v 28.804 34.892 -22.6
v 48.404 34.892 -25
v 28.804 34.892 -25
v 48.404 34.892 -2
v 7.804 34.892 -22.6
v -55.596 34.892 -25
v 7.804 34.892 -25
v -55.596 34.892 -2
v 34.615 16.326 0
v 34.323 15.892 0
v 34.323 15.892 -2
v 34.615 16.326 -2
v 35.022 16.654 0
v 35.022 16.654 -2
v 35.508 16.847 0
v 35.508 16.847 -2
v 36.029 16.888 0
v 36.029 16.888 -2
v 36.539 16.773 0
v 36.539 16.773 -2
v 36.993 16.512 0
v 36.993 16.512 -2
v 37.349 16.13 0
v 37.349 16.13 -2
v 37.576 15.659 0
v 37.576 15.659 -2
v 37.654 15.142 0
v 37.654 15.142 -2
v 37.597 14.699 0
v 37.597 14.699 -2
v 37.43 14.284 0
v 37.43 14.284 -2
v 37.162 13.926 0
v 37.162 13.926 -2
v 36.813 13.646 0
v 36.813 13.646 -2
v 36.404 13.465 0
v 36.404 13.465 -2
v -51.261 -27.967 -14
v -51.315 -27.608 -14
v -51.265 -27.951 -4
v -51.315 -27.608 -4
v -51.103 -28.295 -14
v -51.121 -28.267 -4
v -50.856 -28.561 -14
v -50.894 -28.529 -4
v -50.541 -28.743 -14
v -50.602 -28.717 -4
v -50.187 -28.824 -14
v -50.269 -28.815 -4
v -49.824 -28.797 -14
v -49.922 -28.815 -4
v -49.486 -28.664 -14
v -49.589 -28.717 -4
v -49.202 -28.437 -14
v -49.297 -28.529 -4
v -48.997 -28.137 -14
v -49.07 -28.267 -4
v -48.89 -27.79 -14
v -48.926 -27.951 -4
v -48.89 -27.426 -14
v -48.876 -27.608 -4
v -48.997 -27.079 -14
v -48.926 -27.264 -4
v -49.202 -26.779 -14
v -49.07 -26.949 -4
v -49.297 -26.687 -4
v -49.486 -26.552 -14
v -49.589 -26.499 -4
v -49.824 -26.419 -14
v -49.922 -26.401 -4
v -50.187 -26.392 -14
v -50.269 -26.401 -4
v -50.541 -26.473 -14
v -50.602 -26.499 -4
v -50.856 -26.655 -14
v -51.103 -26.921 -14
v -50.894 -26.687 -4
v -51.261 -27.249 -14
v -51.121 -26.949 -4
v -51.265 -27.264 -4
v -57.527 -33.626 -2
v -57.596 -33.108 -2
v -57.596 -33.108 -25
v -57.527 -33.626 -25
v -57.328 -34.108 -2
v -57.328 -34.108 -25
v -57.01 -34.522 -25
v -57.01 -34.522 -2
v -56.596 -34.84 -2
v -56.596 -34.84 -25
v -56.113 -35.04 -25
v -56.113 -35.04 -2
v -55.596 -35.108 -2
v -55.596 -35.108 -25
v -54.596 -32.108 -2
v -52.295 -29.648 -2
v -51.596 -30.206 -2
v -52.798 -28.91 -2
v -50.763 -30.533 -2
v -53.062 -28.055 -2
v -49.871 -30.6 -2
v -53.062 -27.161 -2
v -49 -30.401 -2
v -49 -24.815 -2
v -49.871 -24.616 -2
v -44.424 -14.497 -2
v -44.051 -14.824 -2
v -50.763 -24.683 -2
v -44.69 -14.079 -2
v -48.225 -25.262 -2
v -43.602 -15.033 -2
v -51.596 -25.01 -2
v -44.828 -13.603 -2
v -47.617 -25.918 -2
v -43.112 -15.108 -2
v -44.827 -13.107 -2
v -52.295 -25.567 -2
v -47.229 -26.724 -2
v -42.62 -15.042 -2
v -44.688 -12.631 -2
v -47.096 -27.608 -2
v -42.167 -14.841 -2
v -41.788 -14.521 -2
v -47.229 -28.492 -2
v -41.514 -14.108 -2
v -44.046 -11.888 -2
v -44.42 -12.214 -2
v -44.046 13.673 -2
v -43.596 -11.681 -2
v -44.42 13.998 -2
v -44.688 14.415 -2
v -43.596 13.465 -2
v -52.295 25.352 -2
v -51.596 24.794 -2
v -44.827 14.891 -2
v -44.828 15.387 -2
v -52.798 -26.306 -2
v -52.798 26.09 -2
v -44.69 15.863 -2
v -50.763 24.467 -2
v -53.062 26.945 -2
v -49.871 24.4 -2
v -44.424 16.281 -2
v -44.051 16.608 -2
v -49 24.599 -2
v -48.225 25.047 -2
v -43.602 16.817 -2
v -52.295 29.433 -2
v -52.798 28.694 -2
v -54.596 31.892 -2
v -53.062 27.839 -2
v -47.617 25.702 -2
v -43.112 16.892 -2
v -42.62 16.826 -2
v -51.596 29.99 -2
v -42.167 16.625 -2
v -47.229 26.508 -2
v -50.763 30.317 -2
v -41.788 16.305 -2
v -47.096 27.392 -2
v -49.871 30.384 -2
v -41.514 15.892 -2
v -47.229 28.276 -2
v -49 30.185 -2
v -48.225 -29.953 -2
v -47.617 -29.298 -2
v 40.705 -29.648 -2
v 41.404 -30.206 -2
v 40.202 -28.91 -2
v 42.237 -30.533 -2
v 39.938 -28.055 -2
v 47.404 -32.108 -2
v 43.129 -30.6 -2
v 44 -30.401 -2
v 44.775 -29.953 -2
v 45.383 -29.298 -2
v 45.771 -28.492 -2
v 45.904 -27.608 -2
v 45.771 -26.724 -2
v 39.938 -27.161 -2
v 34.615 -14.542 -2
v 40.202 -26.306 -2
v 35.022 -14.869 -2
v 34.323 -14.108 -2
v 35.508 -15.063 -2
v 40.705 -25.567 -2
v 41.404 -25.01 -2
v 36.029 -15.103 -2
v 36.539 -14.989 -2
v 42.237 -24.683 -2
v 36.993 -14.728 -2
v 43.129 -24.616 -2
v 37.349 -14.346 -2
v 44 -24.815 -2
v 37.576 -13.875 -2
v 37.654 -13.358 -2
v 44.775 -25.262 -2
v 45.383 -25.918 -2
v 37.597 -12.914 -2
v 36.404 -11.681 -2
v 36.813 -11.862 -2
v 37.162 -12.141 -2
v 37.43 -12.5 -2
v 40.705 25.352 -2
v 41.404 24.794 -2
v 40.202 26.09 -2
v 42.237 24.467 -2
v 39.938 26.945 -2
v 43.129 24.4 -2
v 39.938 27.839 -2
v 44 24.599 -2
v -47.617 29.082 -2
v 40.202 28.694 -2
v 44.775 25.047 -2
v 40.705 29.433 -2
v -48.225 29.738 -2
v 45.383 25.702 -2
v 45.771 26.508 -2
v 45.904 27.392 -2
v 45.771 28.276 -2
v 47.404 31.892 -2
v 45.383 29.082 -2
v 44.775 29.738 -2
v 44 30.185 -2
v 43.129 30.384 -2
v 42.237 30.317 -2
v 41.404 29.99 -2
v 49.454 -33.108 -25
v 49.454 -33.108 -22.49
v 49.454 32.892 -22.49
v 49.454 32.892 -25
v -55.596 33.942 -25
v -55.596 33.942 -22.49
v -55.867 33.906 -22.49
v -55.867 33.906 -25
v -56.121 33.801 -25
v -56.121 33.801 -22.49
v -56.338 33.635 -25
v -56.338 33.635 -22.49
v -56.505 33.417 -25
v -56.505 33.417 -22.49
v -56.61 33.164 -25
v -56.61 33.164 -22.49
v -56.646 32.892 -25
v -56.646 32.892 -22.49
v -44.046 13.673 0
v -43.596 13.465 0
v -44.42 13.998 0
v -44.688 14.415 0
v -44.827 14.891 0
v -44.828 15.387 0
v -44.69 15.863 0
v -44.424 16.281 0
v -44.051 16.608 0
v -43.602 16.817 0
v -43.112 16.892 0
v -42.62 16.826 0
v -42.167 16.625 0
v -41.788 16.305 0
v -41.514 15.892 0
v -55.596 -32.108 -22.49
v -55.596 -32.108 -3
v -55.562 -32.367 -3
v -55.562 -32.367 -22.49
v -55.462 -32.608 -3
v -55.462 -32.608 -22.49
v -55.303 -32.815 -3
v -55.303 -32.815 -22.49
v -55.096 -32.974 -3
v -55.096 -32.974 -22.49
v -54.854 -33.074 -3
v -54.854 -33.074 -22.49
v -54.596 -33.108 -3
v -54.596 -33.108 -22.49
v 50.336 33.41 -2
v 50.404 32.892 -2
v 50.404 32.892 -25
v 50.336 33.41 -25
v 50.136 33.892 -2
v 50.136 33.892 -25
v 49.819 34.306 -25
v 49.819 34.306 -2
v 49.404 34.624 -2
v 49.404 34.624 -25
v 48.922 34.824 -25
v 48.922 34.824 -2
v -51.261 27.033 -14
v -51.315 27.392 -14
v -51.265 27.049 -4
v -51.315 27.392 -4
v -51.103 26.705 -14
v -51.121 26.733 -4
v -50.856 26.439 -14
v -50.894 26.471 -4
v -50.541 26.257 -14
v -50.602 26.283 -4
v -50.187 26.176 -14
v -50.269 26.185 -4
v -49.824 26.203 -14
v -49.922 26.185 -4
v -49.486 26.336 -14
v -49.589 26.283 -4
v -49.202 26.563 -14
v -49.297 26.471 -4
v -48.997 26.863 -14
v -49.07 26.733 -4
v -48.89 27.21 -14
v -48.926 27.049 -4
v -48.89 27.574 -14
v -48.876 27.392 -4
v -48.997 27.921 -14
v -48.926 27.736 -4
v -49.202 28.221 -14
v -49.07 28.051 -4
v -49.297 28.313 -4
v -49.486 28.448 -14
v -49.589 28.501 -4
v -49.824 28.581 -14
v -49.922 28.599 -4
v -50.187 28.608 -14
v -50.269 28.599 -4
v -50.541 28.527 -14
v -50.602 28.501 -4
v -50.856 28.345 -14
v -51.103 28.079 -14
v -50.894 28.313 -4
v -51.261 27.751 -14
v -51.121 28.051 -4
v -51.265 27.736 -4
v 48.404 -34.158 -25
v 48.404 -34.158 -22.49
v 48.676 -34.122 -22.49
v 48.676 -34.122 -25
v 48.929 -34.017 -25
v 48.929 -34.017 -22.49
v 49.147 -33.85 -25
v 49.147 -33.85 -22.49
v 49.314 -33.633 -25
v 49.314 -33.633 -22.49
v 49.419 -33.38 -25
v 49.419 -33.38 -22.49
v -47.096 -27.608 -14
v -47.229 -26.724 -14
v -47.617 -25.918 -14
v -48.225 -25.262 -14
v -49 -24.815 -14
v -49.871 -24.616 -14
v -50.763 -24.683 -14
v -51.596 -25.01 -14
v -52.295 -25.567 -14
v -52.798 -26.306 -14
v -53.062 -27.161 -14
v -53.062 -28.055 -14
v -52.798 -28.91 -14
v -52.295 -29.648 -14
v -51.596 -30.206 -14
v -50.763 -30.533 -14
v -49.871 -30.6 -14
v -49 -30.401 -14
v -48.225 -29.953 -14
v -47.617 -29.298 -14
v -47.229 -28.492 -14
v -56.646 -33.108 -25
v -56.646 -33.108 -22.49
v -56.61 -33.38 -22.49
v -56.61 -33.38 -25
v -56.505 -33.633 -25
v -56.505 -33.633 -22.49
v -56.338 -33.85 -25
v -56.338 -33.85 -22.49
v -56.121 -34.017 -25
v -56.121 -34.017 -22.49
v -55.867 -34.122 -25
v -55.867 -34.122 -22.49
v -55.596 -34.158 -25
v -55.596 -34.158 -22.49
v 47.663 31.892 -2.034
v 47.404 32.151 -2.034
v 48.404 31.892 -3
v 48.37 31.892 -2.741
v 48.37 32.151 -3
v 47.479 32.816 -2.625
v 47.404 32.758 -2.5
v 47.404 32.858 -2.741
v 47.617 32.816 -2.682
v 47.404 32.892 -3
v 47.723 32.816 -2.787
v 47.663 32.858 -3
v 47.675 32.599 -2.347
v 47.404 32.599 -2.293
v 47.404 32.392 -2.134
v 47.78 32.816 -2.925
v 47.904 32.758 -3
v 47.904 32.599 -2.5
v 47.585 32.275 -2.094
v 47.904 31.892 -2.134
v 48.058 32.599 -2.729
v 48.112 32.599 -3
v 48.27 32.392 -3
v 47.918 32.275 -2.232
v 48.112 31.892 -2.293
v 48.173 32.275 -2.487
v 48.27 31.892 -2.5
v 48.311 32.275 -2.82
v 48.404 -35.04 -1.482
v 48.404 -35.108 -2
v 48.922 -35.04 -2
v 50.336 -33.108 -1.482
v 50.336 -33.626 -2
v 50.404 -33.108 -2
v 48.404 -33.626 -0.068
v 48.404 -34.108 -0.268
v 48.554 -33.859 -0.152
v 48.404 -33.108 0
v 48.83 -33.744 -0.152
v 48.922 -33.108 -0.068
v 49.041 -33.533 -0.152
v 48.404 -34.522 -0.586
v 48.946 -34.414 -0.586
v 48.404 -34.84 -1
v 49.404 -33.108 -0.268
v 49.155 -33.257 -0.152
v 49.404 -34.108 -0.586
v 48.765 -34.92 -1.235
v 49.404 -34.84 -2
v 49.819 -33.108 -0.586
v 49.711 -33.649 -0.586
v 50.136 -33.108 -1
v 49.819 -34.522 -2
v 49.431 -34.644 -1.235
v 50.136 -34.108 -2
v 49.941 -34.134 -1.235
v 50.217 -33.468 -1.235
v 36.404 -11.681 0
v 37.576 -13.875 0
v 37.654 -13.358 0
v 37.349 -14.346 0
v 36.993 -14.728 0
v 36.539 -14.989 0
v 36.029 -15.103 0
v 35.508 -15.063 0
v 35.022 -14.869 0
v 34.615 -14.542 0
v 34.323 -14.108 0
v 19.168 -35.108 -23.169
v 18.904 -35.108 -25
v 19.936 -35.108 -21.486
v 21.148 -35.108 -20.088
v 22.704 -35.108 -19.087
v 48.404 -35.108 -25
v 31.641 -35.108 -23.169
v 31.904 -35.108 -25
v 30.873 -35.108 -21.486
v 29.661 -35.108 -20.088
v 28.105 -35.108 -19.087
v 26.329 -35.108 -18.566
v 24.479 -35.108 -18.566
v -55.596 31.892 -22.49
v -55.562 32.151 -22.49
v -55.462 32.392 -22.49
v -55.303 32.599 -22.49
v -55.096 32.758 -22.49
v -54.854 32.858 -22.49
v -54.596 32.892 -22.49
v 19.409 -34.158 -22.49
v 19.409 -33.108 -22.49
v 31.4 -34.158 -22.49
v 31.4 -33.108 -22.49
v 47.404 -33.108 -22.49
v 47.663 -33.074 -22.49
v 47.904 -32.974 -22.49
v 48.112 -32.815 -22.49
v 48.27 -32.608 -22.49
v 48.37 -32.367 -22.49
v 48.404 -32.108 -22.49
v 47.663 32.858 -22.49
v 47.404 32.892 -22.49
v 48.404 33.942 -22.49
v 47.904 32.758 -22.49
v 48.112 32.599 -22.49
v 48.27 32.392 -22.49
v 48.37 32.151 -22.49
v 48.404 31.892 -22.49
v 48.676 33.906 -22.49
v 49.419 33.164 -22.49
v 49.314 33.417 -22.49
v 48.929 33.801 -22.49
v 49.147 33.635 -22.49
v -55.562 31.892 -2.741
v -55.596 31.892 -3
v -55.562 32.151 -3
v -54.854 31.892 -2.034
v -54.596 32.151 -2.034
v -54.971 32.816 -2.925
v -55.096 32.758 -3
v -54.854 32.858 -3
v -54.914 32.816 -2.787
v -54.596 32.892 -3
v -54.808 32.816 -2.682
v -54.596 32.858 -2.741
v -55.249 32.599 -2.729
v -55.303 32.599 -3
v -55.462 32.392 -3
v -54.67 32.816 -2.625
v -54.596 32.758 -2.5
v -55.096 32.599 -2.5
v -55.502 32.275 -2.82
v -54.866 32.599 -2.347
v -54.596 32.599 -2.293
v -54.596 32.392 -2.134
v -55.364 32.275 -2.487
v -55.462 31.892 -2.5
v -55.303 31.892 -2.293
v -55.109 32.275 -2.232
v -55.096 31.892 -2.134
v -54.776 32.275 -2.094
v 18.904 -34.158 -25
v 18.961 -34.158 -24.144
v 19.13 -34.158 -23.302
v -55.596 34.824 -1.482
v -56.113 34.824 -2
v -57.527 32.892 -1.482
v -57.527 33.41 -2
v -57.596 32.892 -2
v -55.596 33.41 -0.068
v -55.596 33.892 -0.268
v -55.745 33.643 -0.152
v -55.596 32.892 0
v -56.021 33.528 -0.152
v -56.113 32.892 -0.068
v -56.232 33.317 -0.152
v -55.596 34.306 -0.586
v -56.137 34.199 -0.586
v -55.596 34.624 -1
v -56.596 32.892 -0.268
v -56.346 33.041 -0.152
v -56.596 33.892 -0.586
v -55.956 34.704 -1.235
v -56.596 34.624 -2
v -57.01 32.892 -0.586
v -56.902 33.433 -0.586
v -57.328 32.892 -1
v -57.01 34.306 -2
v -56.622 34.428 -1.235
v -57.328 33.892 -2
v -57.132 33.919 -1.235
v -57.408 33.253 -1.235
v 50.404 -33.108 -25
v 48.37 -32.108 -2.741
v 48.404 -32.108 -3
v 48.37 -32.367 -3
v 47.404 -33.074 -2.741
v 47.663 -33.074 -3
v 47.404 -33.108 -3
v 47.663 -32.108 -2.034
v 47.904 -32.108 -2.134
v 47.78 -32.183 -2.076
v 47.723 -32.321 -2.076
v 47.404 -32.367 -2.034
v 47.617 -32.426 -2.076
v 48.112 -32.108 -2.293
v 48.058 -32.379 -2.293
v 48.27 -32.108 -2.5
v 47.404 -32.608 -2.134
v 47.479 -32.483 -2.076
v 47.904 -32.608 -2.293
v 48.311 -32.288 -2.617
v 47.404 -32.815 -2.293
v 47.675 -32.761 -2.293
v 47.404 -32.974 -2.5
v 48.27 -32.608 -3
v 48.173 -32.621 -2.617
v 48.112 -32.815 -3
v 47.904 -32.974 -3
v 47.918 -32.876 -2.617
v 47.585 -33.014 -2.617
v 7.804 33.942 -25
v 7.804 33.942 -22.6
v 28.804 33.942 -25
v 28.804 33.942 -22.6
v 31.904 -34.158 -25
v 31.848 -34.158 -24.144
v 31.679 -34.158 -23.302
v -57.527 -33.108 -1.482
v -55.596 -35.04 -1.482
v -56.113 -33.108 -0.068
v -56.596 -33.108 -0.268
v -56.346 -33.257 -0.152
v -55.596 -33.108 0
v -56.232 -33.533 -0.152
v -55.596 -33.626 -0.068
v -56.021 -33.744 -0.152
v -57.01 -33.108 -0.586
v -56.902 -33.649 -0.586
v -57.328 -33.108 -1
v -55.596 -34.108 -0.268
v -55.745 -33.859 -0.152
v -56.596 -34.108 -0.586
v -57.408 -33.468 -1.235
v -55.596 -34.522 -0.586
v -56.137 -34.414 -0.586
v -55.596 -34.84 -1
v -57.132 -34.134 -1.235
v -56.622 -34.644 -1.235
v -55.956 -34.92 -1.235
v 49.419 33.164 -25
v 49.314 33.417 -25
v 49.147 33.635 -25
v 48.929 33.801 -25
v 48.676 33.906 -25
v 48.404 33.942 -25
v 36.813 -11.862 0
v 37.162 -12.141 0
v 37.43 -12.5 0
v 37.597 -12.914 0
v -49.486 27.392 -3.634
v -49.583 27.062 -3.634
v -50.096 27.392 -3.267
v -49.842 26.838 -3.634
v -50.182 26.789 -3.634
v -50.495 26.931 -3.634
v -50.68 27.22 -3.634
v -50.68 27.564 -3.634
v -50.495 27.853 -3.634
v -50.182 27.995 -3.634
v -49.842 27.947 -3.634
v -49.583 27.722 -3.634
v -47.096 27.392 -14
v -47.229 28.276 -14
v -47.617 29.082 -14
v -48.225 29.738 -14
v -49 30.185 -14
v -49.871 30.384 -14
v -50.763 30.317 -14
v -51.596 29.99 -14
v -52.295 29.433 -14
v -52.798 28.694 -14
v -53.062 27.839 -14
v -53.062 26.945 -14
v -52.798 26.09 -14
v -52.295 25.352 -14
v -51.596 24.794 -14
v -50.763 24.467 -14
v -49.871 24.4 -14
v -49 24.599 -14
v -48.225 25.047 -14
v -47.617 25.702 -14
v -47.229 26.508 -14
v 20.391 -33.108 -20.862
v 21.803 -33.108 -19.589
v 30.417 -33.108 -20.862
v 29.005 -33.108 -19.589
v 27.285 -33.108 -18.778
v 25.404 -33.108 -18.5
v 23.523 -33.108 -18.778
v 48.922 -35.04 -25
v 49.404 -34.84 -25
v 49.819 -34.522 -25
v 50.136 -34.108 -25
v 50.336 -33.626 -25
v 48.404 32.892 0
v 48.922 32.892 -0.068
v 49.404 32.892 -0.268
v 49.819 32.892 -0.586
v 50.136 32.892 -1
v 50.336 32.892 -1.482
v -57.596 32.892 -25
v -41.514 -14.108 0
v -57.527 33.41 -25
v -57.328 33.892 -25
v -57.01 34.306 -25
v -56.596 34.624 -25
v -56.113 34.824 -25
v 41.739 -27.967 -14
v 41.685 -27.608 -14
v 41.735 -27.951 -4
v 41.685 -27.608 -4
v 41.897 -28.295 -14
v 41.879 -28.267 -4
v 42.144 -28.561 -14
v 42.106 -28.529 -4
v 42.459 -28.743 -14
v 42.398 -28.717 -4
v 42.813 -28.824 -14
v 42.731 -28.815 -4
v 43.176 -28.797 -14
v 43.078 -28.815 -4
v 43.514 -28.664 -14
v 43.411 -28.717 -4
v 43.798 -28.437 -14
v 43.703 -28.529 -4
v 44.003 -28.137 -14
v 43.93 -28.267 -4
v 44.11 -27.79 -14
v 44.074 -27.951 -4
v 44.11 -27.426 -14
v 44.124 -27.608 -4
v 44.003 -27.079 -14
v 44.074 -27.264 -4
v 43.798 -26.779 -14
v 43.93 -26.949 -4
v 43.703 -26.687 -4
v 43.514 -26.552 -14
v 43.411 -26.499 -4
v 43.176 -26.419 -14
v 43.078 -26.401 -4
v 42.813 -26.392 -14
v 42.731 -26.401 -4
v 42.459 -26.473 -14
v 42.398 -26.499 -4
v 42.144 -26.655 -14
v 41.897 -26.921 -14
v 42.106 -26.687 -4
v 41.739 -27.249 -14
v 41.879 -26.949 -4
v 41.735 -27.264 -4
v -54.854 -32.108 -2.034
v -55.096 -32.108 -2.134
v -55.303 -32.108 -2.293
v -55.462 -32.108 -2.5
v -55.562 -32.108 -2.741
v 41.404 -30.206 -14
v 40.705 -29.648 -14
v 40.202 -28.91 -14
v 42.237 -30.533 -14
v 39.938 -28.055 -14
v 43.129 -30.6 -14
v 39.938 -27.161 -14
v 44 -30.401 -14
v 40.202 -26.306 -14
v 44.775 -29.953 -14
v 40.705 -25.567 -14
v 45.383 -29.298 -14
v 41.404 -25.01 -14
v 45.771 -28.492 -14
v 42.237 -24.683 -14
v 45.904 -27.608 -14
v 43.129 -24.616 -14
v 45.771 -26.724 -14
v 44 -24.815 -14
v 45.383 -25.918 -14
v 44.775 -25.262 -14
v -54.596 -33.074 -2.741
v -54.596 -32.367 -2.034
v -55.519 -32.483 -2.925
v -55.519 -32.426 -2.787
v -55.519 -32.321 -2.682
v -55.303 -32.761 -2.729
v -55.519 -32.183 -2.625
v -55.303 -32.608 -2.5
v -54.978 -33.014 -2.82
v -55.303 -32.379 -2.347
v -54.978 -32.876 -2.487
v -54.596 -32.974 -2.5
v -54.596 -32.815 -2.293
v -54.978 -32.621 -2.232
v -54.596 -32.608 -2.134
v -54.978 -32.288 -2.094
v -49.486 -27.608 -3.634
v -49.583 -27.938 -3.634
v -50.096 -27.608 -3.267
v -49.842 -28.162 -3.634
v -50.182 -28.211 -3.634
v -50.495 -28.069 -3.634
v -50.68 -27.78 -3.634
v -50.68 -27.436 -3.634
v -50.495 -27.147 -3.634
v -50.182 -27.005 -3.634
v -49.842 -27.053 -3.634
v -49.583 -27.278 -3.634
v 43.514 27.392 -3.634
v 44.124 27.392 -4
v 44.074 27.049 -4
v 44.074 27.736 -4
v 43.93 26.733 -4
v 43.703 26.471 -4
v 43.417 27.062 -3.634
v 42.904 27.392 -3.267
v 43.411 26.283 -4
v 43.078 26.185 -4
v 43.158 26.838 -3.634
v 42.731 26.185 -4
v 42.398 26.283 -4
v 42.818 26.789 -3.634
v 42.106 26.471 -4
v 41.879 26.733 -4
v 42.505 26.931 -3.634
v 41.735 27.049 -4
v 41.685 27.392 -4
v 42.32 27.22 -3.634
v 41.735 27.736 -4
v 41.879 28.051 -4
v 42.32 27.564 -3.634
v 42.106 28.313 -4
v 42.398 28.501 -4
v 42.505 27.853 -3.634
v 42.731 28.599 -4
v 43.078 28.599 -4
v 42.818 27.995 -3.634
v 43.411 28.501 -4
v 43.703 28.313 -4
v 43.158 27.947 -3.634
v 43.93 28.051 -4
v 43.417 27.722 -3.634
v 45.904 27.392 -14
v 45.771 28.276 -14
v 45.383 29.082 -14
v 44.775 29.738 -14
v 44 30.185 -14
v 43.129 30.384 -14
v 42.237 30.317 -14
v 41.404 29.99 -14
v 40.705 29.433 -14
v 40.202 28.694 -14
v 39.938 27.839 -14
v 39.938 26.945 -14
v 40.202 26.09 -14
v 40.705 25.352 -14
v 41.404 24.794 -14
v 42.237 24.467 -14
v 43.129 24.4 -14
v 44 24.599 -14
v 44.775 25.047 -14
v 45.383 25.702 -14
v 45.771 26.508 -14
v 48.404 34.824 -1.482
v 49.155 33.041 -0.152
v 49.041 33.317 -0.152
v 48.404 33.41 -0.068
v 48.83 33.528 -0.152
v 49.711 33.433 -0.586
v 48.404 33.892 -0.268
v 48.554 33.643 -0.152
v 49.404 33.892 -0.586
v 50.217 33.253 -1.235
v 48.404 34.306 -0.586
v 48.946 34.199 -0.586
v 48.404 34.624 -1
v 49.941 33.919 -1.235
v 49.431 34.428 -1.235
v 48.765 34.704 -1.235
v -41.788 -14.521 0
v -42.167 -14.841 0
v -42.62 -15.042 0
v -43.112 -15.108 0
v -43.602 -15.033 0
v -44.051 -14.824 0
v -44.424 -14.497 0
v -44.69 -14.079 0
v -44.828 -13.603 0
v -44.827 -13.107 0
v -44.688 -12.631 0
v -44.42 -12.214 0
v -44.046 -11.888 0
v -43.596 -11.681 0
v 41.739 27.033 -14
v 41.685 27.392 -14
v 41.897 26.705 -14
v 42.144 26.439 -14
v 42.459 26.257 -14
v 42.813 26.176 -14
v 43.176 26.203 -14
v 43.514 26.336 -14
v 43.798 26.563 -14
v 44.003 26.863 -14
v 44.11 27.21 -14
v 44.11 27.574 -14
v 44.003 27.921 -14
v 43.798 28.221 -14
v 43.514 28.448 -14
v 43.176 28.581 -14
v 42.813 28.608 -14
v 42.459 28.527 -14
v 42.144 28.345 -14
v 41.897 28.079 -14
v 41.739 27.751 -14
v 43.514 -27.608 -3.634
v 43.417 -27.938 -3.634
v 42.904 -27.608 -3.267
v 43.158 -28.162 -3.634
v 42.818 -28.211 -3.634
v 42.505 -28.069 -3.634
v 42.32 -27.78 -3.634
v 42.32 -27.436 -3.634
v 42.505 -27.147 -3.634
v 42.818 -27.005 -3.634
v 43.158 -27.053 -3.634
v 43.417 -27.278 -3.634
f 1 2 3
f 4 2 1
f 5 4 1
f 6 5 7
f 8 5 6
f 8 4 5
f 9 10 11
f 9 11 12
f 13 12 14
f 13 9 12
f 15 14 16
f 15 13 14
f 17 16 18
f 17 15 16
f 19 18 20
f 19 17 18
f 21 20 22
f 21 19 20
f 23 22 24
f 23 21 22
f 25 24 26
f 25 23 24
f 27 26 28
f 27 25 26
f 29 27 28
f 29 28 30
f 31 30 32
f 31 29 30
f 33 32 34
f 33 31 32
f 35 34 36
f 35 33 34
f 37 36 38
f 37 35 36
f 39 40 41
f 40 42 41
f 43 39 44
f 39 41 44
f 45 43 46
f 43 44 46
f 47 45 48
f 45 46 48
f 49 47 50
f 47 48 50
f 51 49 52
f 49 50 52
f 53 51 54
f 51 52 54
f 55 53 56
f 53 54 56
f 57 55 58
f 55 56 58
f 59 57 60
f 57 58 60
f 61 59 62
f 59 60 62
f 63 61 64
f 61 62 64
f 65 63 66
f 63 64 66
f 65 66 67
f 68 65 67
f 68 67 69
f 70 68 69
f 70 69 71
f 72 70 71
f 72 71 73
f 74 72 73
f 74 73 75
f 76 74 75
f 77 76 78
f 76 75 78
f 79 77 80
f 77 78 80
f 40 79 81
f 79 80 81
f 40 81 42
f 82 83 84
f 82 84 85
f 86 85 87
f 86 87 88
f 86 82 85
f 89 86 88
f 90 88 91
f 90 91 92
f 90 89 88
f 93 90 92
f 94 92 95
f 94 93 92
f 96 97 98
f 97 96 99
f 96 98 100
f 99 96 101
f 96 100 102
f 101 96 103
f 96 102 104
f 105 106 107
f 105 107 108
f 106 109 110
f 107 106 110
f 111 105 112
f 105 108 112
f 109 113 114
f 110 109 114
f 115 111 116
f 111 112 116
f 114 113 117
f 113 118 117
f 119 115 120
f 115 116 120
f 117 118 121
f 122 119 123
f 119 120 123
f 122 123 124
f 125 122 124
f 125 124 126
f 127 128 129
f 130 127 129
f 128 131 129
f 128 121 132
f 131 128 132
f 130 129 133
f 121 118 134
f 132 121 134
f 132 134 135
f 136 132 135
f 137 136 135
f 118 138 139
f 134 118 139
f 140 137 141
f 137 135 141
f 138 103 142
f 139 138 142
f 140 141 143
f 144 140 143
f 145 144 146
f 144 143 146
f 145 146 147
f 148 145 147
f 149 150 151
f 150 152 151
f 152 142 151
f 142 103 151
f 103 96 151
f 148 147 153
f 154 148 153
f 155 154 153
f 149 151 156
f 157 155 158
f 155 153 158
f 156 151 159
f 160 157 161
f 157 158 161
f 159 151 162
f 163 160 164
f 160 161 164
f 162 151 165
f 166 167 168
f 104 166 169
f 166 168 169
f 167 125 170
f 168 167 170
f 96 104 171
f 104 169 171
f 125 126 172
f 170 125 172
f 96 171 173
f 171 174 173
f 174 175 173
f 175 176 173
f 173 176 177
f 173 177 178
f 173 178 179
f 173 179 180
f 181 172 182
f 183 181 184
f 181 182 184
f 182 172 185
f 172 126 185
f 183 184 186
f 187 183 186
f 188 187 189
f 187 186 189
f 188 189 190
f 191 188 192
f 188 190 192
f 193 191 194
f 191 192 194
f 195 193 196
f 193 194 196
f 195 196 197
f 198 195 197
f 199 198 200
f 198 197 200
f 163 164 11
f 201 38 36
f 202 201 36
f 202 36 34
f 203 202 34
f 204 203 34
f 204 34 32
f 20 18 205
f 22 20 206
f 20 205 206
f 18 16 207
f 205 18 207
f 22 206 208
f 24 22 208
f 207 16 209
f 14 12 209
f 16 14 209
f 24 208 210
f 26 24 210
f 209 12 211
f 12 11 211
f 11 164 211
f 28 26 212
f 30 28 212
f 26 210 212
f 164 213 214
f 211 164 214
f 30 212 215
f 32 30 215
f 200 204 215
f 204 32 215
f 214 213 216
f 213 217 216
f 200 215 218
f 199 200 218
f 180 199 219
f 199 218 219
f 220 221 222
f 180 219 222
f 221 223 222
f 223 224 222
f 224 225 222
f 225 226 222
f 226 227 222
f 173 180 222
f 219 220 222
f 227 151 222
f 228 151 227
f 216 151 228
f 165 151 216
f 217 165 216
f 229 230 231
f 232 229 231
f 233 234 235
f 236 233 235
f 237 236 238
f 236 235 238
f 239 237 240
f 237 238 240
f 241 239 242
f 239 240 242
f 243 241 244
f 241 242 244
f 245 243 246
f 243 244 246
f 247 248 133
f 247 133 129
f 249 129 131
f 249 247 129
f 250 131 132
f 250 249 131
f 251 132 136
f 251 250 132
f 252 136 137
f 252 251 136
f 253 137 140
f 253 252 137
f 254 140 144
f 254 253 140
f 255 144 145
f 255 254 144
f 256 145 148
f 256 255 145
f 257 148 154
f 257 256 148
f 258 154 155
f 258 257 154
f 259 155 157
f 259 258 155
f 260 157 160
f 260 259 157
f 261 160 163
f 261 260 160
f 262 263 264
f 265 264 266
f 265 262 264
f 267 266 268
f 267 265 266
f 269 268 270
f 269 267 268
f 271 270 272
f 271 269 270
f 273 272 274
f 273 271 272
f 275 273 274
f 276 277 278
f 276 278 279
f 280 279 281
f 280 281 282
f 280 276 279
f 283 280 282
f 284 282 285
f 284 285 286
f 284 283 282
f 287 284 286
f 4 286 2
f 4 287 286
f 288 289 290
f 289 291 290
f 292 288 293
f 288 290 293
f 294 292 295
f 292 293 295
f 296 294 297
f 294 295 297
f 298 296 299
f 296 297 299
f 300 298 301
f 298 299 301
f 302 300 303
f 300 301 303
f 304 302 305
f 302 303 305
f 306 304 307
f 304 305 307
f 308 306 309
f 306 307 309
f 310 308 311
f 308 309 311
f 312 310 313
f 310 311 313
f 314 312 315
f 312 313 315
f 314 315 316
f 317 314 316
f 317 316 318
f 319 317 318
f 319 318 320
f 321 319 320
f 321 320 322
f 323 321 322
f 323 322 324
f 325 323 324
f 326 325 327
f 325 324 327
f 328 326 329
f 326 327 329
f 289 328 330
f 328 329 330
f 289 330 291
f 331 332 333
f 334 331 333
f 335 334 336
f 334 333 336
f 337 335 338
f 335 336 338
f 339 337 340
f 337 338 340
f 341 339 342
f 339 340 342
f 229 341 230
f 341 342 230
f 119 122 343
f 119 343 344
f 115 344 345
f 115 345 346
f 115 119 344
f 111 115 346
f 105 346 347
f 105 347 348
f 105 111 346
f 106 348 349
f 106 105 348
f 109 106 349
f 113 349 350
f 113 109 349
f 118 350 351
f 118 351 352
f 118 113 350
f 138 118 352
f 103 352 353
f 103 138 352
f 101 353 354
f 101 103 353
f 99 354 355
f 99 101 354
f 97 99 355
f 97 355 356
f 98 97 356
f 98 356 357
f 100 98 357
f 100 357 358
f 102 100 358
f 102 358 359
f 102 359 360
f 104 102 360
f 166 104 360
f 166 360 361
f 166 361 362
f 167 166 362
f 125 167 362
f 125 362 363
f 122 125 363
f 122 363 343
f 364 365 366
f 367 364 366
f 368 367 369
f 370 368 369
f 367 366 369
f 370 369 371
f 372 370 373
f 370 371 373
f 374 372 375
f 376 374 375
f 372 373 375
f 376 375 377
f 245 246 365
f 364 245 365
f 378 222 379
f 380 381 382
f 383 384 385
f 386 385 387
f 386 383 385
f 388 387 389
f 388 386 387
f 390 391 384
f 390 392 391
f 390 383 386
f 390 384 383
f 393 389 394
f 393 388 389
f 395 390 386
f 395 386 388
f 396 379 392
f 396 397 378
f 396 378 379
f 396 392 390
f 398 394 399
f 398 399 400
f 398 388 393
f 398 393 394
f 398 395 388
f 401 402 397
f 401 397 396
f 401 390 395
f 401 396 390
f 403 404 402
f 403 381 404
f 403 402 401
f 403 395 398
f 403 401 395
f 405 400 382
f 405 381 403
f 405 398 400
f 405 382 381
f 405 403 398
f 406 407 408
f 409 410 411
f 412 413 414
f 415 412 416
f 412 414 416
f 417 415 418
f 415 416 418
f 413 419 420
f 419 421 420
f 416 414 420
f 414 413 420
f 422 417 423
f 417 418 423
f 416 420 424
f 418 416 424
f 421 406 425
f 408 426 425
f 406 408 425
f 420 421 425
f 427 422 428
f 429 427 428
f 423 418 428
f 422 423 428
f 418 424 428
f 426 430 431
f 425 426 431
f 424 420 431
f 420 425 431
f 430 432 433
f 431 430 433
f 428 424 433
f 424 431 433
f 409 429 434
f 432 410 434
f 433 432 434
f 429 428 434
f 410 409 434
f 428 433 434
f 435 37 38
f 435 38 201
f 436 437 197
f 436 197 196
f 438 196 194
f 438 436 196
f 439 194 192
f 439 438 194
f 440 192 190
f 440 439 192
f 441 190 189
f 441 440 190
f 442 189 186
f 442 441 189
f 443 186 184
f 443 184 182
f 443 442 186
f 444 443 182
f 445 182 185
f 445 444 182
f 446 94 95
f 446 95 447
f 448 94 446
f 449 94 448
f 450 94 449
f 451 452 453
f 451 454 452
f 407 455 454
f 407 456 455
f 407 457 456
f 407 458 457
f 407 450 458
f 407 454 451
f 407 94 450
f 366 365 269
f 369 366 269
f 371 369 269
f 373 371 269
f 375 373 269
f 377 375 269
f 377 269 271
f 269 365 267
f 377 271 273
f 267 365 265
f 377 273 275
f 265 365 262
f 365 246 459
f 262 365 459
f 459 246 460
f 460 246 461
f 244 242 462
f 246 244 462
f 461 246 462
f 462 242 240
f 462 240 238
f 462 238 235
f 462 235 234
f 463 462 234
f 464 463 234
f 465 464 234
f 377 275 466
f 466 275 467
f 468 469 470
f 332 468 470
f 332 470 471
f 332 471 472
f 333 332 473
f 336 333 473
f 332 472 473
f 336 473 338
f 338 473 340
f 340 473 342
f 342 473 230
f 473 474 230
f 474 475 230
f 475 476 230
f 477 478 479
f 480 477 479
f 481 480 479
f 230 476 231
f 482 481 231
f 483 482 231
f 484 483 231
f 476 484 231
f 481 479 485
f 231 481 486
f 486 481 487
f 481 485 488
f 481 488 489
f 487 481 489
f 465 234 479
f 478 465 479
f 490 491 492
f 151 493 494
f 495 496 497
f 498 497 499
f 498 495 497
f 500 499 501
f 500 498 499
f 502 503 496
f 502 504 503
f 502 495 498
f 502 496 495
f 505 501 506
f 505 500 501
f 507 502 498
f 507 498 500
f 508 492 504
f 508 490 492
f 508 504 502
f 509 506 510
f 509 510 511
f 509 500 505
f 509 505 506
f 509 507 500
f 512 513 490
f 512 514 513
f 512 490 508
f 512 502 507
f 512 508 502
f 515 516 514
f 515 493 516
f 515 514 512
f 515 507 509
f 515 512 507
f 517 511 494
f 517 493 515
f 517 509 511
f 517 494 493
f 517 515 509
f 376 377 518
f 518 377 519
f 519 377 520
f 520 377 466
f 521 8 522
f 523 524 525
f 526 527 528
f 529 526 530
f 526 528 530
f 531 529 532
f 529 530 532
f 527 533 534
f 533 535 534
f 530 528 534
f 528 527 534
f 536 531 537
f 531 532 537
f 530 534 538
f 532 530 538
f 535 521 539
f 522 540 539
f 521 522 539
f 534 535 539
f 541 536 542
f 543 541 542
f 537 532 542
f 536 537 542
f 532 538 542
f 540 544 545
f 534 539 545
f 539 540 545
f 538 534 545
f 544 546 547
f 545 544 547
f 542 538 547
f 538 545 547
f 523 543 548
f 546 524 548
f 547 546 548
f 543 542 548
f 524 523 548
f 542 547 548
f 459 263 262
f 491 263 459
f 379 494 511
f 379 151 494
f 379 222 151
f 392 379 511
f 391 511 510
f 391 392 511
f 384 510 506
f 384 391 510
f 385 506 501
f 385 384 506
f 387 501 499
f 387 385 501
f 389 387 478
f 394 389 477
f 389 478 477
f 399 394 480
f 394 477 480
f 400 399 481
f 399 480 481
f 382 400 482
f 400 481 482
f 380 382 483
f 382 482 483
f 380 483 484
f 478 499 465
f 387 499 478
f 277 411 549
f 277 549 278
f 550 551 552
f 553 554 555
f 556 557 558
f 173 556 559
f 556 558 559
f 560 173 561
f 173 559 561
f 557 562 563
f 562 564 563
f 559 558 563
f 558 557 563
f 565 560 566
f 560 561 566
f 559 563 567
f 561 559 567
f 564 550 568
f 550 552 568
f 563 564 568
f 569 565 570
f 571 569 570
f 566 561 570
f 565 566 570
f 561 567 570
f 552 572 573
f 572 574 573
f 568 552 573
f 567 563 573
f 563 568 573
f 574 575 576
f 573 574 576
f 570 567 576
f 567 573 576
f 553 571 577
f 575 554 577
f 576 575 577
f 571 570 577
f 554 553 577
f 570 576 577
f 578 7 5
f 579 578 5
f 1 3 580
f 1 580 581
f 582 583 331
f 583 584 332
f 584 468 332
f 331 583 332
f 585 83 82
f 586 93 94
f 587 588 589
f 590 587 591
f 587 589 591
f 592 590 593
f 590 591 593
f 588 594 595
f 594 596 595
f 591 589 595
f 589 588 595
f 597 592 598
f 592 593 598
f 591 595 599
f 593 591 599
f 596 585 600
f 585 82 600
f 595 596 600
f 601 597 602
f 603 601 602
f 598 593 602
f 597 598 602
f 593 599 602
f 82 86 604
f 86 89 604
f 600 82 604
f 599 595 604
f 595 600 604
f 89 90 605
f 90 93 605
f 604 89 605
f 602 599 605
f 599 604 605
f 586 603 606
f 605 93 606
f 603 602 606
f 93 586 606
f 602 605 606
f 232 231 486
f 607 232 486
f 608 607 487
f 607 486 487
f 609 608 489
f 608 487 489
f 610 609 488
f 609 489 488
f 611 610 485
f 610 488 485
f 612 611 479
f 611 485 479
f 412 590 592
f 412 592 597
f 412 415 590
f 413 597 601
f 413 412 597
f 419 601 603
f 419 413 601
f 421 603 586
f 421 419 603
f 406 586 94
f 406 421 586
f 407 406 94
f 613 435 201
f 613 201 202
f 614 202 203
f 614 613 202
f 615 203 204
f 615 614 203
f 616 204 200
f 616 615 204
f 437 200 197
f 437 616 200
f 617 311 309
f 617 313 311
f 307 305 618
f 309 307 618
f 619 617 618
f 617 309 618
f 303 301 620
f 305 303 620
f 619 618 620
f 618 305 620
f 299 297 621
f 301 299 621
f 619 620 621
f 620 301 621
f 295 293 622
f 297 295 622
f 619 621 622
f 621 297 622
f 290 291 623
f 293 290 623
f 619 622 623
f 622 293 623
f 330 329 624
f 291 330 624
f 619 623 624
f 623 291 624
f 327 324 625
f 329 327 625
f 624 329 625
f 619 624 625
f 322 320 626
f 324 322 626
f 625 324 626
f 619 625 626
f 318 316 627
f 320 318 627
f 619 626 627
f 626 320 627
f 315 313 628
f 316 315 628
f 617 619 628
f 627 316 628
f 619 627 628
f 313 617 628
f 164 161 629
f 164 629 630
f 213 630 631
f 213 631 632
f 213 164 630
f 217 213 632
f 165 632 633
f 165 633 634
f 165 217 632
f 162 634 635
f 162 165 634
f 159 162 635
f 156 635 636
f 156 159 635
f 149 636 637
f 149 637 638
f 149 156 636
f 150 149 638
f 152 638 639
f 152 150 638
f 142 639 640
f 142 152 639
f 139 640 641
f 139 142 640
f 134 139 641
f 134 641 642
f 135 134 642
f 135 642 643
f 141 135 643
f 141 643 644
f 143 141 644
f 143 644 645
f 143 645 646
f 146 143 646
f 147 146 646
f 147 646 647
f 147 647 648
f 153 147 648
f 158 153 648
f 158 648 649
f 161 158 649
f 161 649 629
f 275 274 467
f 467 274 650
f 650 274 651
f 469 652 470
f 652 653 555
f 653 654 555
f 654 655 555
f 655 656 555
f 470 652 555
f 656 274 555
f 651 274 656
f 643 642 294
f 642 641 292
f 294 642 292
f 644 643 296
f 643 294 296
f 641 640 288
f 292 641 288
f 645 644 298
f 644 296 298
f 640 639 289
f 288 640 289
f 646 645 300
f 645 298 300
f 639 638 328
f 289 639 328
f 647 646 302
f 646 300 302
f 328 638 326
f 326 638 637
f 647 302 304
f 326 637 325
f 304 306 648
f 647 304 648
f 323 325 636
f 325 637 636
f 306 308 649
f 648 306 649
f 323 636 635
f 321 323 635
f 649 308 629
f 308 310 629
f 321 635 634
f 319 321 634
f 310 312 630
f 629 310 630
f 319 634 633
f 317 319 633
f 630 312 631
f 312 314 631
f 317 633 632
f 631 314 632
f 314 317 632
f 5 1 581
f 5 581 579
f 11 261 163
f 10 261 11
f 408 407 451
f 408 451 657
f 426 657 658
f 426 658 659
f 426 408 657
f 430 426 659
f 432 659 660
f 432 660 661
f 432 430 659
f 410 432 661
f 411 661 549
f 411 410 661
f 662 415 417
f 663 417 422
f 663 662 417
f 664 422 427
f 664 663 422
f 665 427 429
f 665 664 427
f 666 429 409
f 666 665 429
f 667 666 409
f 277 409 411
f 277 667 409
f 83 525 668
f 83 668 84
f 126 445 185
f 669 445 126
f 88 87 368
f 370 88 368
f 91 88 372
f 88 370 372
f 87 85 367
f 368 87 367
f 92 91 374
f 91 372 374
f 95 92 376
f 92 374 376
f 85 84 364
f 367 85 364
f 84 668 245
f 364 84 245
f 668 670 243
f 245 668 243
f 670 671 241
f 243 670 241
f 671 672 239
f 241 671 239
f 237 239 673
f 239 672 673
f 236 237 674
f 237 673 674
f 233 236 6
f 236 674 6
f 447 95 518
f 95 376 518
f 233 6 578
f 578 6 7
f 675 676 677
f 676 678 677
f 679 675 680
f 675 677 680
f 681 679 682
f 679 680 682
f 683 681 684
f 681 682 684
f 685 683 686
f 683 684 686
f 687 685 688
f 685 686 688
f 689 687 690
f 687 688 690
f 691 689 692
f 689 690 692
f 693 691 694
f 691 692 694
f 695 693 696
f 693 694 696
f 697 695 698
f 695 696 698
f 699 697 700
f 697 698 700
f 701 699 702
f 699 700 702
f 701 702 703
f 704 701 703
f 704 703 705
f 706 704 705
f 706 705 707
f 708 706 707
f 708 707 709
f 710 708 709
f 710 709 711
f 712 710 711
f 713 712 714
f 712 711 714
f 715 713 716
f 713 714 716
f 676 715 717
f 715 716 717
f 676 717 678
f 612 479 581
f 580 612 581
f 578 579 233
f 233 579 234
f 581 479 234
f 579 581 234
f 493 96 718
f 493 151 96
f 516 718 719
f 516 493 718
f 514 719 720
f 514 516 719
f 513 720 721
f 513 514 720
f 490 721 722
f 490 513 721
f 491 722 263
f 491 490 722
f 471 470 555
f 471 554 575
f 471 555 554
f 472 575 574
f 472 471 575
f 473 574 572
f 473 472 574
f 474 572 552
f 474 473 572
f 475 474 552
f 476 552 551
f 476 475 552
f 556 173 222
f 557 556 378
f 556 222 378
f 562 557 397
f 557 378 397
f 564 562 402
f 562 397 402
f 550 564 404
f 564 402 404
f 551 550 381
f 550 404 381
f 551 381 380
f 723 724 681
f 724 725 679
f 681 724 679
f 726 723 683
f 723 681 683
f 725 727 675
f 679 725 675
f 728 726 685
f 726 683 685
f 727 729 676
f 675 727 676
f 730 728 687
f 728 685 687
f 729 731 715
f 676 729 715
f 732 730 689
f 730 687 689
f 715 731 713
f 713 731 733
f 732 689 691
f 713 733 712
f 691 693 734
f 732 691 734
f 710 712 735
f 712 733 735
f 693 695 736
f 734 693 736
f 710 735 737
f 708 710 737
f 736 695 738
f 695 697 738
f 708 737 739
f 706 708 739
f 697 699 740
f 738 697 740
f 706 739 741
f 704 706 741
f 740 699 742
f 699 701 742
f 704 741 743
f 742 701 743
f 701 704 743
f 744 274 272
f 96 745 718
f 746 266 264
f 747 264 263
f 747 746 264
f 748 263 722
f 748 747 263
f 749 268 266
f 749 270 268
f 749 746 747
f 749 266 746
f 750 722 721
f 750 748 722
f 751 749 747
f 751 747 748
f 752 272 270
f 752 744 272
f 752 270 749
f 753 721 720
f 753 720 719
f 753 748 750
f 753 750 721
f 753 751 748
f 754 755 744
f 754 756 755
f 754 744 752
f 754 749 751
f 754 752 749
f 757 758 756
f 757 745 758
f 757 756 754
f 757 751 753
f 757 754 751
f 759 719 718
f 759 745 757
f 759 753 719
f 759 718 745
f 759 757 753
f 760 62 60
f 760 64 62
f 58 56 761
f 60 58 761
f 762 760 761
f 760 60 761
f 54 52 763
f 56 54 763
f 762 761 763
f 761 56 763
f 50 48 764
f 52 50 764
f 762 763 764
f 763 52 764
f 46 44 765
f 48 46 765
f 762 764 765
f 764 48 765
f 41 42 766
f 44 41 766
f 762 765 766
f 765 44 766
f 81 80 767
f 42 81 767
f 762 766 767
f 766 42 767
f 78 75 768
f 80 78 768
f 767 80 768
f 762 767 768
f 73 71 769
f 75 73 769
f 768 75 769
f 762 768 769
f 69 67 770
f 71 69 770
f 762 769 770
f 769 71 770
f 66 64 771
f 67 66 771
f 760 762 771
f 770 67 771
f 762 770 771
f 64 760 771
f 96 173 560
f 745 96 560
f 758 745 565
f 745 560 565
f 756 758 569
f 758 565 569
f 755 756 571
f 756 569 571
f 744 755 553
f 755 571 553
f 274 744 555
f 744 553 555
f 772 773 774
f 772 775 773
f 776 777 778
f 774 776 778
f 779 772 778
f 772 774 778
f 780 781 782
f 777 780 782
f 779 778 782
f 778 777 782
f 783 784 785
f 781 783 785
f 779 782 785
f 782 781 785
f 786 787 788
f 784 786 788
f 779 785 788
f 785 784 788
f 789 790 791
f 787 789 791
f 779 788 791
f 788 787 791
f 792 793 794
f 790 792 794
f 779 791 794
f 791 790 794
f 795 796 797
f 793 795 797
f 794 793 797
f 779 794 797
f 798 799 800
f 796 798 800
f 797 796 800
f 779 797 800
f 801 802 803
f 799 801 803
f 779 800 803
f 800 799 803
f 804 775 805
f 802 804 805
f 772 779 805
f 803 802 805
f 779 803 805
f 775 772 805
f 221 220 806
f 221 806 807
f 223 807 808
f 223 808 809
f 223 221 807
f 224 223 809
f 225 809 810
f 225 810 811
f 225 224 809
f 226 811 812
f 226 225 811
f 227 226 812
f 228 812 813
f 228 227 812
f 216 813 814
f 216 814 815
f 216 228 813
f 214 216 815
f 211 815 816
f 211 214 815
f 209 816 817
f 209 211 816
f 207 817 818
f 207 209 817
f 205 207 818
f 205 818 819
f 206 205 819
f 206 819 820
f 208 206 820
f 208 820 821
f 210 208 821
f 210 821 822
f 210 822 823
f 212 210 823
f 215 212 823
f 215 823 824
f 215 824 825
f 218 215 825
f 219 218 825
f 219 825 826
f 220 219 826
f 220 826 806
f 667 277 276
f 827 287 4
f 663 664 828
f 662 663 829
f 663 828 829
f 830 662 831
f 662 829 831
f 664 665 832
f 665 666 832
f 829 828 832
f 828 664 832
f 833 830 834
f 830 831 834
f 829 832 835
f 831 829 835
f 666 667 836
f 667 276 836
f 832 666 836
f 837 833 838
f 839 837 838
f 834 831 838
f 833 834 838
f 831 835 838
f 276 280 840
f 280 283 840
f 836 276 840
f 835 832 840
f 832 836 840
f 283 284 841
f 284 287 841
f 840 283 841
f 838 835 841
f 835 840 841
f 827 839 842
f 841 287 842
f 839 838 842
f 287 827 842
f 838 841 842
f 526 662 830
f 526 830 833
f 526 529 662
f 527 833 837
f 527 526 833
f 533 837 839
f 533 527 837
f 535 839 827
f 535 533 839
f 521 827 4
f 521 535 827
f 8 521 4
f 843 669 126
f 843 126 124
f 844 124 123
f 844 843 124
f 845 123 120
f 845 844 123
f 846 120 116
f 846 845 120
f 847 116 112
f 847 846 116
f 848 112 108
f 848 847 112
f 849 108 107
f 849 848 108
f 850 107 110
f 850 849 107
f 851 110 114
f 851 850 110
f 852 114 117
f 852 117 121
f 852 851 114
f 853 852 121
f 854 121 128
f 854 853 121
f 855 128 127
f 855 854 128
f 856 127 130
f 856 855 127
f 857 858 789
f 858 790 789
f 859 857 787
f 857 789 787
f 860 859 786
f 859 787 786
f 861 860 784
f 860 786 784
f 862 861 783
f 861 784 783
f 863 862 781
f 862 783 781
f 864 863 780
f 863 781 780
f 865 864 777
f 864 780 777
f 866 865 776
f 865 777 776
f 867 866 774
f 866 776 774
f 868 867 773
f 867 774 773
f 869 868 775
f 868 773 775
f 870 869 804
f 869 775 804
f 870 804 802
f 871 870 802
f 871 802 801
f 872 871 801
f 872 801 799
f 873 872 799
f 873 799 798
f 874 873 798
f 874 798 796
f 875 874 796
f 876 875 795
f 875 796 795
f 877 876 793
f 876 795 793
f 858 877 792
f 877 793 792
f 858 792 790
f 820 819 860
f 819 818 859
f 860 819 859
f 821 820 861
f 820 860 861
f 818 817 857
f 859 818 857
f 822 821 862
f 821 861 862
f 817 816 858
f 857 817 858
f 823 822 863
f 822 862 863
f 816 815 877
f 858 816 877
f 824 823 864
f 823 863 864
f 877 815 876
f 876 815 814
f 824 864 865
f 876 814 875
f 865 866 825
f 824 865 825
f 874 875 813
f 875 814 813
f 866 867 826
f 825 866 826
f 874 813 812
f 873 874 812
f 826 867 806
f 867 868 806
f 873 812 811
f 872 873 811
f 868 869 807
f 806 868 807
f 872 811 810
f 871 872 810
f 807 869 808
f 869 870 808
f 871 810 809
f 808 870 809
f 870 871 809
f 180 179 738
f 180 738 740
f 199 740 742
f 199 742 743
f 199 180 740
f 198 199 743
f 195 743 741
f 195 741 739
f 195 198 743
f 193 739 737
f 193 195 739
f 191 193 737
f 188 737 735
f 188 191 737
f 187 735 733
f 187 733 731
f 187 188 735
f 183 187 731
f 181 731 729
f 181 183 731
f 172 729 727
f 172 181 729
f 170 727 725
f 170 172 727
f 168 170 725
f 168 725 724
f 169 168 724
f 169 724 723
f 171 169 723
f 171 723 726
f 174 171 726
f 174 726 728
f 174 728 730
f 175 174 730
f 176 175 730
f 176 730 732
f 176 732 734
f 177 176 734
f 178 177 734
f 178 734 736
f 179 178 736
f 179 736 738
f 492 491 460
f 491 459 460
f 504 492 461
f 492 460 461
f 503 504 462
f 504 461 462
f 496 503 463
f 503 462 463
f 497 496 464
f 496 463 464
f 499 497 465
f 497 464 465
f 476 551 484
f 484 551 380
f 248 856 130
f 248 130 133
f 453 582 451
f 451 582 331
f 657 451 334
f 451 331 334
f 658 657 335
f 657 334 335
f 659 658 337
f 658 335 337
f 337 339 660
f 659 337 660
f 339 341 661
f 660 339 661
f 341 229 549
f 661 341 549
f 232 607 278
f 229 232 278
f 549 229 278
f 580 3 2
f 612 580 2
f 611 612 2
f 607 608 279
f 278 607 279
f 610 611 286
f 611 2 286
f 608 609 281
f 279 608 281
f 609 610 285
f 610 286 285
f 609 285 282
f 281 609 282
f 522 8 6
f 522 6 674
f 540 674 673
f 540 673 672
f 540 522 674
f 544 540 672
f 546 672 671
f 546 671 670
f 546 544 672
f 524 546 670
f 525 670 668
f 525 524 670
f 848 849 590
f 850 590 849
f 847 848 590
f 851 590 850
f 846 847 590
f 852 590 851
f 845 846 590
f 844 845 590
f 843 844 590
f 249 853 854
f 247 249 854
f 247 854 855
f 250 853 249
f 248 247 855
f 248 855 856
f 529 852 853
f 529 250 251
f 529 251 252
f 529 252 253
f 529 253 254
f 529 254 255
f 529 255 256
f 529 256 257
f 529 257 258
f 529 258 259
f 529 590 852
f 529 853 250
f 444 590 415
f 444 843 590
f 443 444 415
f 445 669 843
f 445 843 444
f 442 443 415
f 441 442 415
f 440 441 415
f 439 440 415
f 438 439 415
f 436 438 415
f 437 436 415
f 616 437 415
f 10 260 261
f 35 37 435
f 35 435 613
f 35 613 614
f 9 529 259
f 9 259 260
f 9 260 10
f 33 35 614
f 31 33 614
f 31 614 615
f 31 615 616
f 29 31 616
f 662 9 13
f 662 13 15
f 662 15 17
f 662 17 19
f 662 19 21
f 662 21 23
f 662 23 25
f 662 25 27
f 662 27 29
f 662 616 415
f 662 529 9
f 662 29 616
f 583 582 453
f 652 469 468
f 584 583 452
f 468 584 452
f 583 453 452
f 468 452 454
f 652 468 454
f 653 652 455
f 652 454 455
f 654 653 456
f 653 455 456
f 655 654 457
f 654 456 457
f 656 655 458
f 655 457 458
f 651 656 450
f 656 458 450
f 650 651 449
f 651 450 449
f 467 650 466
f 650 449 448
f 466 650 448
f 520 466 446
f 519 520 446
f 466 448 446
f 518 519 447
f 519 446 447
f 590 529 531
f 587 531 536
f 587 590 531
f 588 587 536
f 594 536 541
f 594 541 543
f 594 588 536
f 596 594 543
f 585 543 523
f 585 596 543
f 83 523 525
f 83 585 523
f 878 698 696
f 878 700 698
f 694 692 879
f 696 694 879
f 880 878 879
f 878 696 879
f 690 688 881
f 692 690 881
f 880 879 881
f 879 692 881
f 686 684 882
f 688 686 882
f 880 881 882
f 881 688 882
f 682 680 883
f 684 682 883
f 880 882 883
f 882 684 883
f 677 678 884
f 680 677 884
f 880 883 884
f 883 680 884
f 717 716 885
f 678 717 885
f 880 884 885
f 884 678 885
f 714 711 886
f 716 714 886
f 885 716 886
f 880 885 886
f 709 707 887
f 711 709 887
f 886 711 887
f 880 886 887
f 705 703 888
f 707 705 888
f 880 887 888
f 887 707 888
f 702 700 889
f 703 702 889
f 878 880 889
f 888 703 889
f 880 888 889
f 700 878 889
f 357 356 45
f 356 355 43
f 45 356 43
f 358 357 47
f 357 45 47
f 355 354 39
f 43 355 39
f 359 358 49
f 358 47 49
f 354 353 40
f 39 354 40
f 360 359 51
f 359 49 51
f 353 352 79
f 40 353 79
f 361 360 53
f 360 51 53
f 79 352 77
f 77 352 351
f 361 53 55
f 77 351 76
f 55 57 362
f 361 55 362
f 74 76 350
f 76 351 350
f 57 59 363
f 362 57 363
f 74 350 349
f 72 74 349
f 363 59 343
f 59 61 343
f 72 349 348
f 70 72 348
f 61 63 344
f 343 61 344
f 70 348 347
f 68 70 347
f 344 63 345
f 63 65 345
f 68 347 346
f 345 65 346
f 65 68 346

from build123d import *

# Parameters (mm, degrees)
F0_W      = 104
F0_H      = 66
F0_R      = 3
F1_DEPTH  = 2
F2_DEPTH  = 22.49
F3_DEPTH  = 23
F4_DEPTH  = 14
F6_DEPTH  = 2.5
F7_W      = 21
F7_H      = 2.4
F8_DEPTH  = 2.5
F10_D     = 2.4384
F10_DEPTH = 10
F10_TIP   = 0.7325692667
F11_R     = 2
F12_R     = 1


with BuildPart() as f1:
    # F0 (on Top) → F1 (new body)
    with BuildSketch(Plane.XY):
        with BuildLine():
            Line((48.4044117422, 34.8920698583), (-55.5955882578, 34.8920698583))
            ThreePointArc((-55.5955882578, 34.8920698583), (-57.0098018202, 34.3062834207), (-57.5955882578, 32.8920698583))
            Line((-57.5955882578, 32.8920698583), (-57.5955882578, -33.1079301417))
            ThreePointArc((-57.5955882578, -33.1079301417), (-57.0098018202, -34.5221437041), (-55.5955882578, -35.1079301417))
            Line((-55.5955882578, -35.1079301417), (48.4044117422, -35.1079301417))
            ThreePointArc((48.4044117422, -35.1079301417), (49.8186253046, -34.5221437041), (50.4044117422, -33.1079301417))
            Line((50.4044117422, -33.1079301417), (50.4044117422, 32.8920698583))
            ThreePointArc((50.4044117422, 32.8920698583), (49.8186253046, 34.3062834207), (48.4044117422, 34.8920698583))
        make_face()
        with BuildLine():
            ThreePointArc((-56.6455882578, 32.8920698583), (-56.338050378, 33.6345319786), (-55.5955882578, 33.9420698583))
            Line((-55.5955882578, 33.9420698583), (48.4044117422, 33.9420698583))
            ThreePointArc((48.4044117422, 33.9420698583), (49.1468738625, 33.6345319786), (49.4544117422, 32.8920698583))
            Line((49.4544117422, 32.8920698583), (49.4544117422, -33.1079301417))
            ThreePointArc((49.4544117422, -33.1079301417), (49.1468738625, -33.8503922619), (48.4044117422, -34.1579301417))
            Line((48.4044117422, -34.1579301417), (-55.5955882578, -34.1579301417))
            ThreePointArc((-55.5955882578, -34.1579301417), (-56.338050378, -33.8503922619), (-56.6455882578, -33.1079301417))
            Line((-56.6455882578, -33.1079301417), (-56.6455882578, 32.8920698583))
        make_face(mode=Mode.SUBTRACT)
        with BuildLine():
            Line((48.4044117422, 33.9420698583), (-55.5955882578, 33.9420698583))
            ThreePointArc((-55.5955882578, 33.9420698583), (-56.338050378, 33.6345319786), (-56.6455882578, 32.8920698583))
            Line((-56.6455882578, 32.8920698583), (-56.6455882578, -33.1079301417))
            ThreePointArc((-56.6455882578, -33.1079301417), (-56.338050378, -33.8503922619), (-55.5955882578, -34.1579301417))
            Line((-55.5955882578, -34.1579301417), (48.4044117422, -34.1579301417))
            ThreePointArc((48.4044117422, -34.1579301417), (49.1468738625, -33.8503922619), (49.4544117422, -33.1079301417))
            Line((49.4544117422, -33.1079301417), (49.4544117422, 32.8920698583))
            ThreePointArc((49.4544117422, 32.8920698583), (49.1468738625, 33.6345319786), (48.4044117422, 33.9420698583))
        make_face()
        with Locations((-3.5955882578, -0.1079301417)):
            Rectangle(F0_W, F0_H, mode=Mode.SUBTRACT)
        with Locations((-3.5955882578, -0.1079301417)):
            Rectangle(F0_W, F0_H)
        with Locations((-50.0955882578, -27.6079301417)):
            Circle(F0_R, mode=Mode.SUBTRACT)
        with Locations((42.9044117422, -27.6079301417)):
            Circle(F0_R, mode=Mode.SUBTRACT)
        with Locations((-50.0955882578, 27.3920698583)):
            Circle(F0_R, mode=Mode.SUBTRACT)
        with BuildLine():
            ThreePointArc((-43.5955882578, 13.4650188752), (-44.424068371, 16.2812101433), (-41.5144494277, 15.8920698583))
            Line((-41.5144494277, 15.8920698583), (34.3232729121, 15.8920698583))
            ThreePointArc((34.3232729121, 15.8920698583), (36.2887989476, 16.8493327192), (37.6544117422, 15.1420698583))
            ThreePointArc((37.6544117422, 15.1420698583), (37.3075332623, 14.0962448251), (36.4044117422, 13.4650188752))
            Line((36.4044117422, 13.4650188752), (36.4044117422, -11.6808791586))
            ThreePointArc((36.4044117422, -11.6808791586), (37.3075332623, -12.3121051085), (37.6544117422, -13.3579301417))
            ThreePointArc((37.6544117422, -13.3579301417), (36.2887989476, -15.0651930026), (34.3232729121, -14.1079301417))
            Line((34.3232729121, -14.1079301417), (-41.5144494277, -14.1079301417))
            ThreePointArc((-41.5144494277, -14.1079301417), (-44.424068371, -14.4970704267), (-43.5955882578, -11.6808791586))
            Line((-43.5955882578, -11.6808791586), (-43.5955882578, 13.4650188752))
        make_face(mode=Mode.SUBTRACT)
        with Locations((42.9044117422, 27.3920698583)):
            Circle(F0_R, mode=Mode.SUBTRACT)
        with Locations((-50.0955882578, 27.3920698583)):
            Circle(F0_R)
        with Locations((42.9044117422, 27.3920698583)):
            Circle(F0_R)
        with Locations((42.9044117422, -27.6079301417)):
            Circle(F0_R)
        with Locations((-50.0955882578, -27.6079301417)):
            Circle(F0_R)
    extrude(amount=-F1_DEPTH)

    # F0 (on Top) → F2 (join)
    with BuildSketch(Plane.XY):
        with BuildLine():
            Line((48.4044117422, 33.9420698583), (-55.5955882578, 33.9420698583))
            ThreePointArc((-55.5955882578, 33.9420698583), (-56.338050378, 33.6345319786), (-56.6455882578, 32.8920698583))
            Line((-56.6455882578, 32.8920698583), (-56.6455882578, -33.1079301417))
            ThreePointArc((-56.6455882578, -33.1079301417), (-56.338050378, -33.8503922619), (-55.5955882578, -34.1579301417))
            Line((-55.5955882578, -34.1579301417), (48.4044117422, -34.1579301417))
            ThreePointArc((48.4044117422, -34.1579301417), (49.1468738625, -33.8503922619), (49.4544117422, -33.1079301417))
            Line((49.4544117422, -33.1079301417), (49.4544117422, 32.8920698583))
            ThreePointArc((49.4544117422, 32.8920698583), (49.1468738625, 33.6345319786), (48.4044117422, 33.9420698583))
        make_face()
        with Locations((-3.5955882578, -0.1079301417)):
            Rectangle(F0_W, F0_H, mode=Mode.SUBTRACT)
    extrude(amount=-F2_DEPTH)

    # F3 (add): a face of the model
    f3_faces = [f1.faces().sort_by_distance(p)[0] for p in [
        (-3.5955882578, 34.763368654, -2),
    ]]
    extrude(f3_faces, amount=F3_DEPTH)

    # F0 (on Top) → F4 (join)
    with BuildSketch(Plane.XY):
        with Locations((-50.0955882578, 27.3920698583)):
            Circle(F0_R)
        with Locations((42.9044117422, 27.3920698583)):
            Circle(F0_R)
        with Locations((-50.0955882578, -27.6079301417)):
            Circle(F0_R)
        with Locations((42.9044117422, -27.6079301417)):
            Circle(F0_R)
    extrude(amount=-F4_DEPTH)

    # F5 (on face) → F6 (cut)
    with BuildSketch(Plane.XZ.offset(35.1079301417)):
        with BuildLine():
            Line((18.9044117422, -25), (31.9044117422, -25))
            ThreePointArc((31.9044117422, -25), (25.4044117422, -18.5), (18.9044117422, -25))
        make_face()
    extrude(amount=-F6_DEPTH, mode=Mode.SUBTRACT)

    # F7 (on face) → F8 (cut)
    with BuildSketch(Plane(origin=(0, 34.8920698583, 0), x_dir=(-1, 0, 0), z_dir=(0, 1, 0))):
        with Locations((-18.3044117422, -23.8)):
            Rectangle(F7_W, F7_H)
    extrude(amount=-F8_DEPTH, mode=Mode.SUBTRACT)

    # F10
    with Locations(Plane(origin=(0, 0, -14), x_dir=(1, 0, 0), z_dir=(0, 0, -1))):
        with Locations((-50.0955882578, -27.3920698583), (42.9044117422, -27.3920698583), (42.9044117422, 27.6079301417), (-50.0955882578, 27.6079301417)):
            Hole(F10_D / 2, depth=F10_DEPTH)
            with Locations((0, 0, -(F10_DEPTH + F10_TIP / 2))):  # 118° drill point
                Cone(0, F10_D / 2, F10_TIP, mode=Mode.SUBTRACT)

    # F11
    f11_edges = [f1.edges().sort_by_distance(p)[0] for p in [
        (-57.595588, -0.10793, 0),
        (-3.595588, 34.89207, 0),
        (50.404412, -0.10793, 0),
        (-3.595588, -35.10793, 0),
        (-57.009802, 34.306283, 0),
        (-57.009802, -34.522144, 0),
        (49.818625, -34.522144, 0),
        (49.818625, 34.306283, 0),
    ]]
    fillet(f11_edges, radius=F11_R)

    # F12
    f12_edges = [f1.edges().sort_by_distance(p)[0] for p in [
        (48.404412, -33.10793, -12.245),
        (48.404412, -0.10793, -2),
        (-3.595588, -33.10793, -2),
        (-55.595588, -33.10793, -12.245),
        (-55.595588, -0.10793, -2),
        (-55.595588, 32.89207, -12.245),
        (-3.595588, 32.89207, -2),
        (48.404412, 32.89207, -12.245),
    ]]
    fillet(f12_edges, radius=F12_R)


solid = f1.part
